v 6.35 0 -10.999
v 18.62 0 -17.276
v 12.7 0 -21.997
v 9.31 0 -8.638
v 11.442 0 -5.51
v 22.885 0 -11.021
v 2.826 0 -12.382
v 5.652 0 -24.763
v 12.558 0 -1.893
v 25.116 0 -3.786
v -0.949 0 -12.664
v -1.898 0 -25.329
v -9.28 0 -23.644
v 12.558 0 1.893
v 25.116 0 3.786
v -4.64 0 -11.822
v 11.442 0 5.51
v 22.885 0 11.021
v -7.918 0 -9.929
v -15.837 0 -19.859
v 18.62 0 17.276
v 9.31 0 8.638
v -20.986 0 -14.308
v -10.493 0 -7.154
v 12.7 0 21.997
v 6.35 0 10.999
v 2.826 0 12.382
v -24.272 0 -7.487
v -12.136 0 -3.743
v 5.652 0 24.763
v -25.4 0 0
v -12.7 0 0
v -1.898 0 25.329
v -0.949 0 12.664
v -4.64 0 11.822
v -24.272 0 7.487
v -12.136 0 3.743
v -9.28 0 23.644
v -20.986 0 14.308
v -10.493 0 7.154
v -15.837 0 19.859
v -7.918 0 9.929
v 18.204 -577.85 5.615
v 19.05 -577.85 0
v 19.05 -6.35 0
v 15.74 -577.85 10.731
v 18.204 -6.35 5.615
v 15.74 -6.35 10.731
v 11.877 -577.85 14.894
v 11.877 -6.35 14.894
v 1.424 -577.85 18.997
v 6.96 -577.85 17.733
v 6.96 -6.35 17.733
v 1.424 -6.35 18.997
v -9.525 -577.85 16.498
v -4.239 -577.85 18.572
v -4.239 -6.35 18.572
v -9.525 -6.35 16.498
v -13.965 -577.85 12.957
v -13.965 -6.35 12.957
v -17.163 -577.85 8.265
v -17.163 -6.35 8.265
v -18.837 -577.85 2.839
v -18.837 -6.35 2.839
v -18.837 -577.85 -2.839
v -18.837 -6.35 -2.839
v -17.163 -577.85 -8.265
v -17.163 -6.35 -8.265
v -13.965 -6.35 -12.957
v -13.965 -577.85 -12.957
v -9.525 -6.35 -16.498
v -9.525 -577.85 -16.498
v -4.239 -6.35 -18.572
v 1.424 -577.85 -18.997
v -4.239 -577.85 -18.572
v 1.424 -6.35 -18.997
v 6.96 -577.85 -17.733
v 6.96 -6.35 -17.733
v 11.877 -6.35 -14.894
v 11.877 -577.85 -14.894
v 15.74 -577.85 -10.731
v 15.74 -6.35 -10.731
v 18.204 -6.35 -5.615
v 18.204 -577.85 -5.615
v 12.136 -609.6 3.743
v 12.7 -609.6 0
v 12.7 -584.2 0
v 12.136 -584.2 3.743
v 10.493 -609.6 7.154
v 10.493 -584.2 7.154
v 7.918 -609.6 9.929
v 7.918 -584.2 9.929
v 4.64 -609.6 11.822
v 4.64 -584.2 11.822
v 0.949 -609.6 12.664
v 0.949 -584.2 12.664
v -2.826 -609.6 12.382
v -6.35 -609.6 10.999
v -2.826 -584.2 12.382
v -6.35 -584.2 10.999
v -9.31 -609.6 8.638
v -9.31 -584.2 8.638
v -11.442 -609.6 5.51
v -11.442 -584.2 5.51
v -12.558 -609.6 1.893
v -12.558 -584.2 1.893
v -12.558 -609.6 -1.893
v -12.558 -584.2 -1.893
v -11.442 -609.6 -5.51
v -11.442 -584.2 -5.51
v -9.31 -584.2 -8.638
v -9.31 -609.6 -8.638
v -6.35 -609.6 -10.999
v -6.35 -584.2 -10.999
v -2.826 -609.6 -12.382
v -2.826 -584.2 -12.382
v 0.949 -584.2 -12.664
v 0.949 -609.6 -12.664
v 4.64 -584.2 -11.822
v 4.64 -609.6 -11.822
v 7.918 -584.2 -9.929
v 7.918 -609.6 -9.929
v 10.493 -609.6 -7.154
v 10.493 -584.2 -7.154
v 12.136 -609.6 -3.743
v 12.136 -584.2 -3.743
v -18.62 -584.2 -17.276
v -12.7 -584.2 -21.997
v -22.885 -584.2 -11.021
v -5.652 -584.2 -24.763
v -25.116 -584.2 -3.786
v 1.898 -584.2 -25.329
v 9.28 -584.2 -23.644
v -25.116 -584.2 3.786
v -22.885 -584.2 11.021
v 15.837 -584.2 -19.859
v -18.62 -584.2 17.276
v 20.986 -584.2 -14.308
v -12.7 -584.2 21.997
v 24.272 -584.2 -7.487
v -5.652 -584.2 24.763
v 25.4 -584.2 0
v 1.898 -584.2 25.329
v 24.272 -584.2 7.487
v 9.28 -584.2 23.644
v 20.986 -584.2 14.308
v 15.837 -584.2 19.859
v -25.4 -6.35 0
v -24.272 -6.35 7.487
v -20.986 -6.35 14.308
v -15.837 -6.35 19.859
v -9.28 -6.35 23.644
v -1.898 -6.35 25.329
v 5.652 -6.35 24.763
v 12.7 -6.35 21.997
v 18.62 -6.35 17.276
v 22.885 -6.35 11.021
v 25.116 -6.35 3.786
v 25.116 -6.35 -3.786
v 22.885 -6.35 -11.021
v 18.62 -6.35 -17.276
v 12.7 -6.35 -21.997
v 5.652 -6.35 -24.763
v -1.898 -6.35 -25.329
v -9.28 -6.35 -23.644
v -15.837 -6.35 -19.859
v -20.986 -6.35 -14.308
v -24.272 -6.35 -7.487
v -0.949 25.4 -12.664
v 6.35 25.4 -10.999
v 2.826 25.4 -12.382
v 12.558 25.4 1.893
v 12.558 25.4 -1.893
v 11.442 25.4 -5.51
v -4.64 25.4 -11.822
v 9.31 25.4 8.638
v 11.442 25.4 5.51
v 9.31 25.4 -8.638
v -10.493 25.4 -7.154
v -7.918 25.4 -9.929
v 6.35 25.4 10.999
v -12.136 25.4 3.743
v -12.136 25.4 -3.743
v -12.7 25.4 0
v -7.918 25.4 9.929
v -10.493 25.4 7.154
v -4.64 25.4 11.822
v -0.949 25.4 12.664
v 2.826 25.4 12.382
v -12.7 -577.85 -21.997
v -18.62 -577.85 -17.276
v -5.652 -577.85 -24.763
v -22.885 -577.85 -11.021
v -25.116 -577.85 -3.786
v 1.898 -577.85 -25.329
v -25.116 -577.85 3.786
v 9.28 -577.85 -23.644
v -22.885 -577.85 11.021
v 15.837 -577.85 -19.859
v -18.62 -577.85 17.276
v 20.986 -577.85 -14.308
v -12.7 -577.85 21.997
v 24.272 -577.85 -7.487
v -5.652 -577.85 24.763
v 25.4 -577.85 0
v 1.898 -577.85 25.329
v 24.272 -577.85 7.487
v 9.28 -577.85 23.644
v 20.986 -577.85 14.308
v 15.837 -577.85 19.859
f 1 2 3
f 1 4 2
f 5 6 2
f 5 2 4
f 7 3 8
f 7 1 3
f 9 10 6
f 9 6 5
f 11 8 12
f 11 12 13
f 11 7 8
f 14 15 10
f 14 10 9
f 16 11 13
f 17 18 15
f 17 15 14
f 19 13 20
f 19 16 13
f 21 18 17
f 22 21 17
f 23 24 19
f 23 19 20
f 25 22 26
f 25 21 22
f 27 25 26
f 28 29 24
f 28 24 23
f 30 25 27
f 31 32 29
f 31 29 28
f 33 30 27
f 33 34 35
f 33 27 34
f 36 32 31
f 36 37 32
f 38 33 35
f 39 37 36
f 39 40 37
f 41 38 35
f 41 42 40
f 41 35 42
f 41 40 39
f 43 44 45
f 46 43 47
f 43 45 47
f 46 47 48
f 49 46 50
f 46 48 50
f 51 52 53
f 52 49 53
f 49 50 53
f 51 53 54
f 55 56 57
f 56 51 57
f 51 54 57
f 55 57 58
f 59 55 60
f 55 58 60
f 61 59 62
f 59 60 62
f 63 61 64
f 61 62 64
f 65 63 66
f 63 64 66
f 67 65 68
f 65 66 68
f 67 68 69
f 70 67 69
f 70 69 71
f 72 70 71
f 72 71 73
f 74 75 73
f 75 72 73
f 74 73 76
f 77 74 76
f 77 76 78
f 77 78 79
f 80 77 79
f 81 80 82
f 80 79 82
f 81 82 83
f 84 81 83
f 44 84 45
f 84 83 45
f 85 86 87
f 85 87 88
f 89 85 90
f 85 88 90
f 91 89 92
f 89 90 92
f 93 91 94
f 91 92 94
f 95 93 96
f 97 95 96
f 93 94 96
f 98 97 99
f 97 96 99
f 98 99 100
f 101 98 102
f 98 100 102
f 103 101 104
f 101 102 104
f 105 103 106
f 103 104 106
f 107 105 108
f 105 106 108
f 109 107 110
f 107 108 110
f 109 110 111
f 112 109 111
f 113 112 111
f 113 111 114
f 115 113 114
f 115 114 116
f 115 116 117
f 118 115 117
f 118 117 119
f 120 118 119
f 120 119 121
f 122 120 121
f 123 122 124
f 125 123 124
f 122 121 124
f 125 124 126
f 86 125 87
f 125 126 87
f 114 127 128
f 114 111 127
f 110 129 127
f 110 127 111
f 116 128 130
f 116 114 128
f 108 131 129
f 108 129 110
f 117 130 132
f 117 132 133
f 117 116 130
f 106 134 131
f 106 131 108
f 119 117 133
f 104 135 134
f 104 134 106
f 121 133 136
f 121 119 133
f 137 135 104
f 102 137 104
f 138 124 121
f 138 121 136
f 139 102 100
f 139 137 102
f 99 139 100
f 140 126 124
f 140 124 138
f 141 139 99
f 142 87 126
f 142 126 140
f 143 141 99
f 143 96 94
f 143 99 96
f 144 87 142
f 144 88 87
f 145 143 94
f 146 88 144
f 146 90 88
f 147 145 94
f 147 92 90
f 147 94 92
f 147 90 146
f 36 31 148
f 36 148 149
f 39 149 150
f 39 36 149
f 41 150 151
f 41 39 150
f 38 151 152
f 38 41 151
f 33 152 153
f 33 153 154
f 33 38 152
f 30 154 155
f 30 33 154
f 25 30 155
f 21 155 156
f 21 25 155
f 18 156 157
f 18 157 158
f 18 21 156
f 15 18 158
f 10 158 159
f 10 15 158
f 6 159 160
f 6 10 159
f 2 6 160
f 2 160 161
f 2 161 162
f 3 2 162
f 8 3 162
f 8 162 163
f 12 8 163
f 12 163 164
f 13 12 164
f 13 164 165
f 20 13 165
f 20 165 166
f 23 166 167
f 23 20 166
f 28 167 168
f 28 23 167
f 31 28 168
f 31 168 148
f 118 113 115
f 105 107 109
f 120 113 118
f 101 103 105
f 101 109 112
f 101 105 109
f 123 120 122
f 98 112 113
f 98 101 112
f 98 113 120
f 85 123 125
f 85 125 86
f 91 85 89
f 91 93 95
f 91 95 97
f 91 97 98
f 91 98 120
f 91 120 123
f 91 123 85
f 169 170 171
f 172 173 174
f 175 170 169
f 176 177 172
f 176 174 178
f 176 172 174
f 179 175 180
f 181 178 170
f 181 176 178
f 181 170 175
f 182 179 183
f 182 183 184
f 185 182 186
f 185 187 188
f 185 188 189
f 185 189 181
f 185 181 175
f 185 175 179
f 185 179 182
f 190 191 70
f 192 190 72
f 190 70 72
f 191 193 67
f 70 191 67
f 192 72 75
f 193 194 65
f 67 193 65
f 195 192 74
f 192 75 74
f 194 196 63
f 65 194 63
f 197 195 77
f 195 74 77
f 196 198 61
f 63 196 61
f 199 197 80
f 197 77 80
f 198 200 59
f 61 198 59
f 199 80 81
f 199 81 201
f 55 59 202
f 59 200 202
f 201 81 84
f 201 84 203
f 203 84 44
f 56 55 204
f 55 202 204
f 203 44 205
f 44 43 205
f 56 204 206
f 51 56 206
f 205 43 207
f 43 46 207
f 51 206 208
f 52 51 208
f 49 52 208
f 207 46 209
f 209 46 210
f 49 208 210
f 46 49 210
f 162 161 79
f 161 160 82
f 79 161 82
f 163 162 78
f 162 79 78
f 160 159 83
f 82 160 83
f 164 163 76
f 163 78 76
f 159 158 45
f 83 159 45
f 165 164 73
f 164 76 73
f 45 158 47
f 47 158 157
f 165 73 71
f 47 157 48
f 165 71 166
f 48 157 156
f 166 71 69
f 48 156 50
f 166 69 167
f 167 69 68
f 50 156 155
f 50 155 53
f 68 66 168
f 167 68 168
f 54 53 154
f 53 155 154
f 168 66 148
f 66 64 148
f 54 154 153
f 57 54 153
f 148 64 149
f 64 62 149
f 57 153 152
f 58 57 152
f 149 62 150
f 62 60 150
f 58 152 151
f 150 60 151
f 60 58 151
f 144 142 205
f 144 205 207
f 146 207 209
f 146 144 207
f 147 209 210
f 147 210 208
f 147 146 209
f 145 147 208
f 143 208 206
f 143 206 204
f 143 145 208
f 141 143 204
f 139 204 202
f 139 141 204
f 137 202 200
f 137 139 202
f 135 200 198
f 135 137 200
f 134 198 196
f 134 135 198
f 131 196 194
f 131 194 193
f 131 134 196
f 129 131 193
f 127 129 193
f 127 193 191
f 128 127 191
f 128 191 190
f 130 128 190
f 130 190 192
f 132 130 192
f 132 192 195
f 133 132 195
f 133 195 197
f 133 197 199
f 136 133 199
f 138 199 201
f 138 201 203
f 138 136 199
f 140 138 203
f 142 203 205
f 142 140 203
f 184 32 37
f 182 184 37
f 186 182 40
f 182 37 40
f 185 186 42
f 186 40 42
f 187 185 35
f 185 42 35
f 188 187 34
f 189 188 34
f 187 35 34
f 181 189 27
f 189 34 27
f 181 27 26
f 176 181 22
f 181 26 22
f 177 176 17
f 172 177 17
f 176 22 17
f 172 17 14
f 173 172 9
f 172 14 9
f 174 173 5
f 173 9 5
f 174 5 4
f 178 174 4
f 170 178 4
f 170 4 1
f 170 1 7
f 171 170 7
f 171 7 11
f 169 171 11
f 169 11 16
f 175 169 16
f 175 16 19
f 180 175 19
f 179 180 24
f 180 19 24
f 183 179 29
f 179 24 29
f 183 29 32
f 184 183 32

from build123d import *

# Parameters (mm, degrees)
F0_R     = 19.05
F1_DEPTH = 584.2
F3_R     = 25.4
F4_DEPTH = 6.35
F2_R     = 25.4
F2_R_2   = 19.05
F5_DEPTH = 6.35
F6_R     = 12.7
F7_DEPTH = 25.4
F8_R     = 12.7
F9_DEPTH = 25.4


with BuildPart() as f1:
    # F0 (on Front) → F1 (new body)
    with BuildSketch(Plane.XZ):
        Circle(F0_R)
    extrude(amount=F1_DEPTH)

    # F3 (on face) → F4 (join)
    with BuildSketch(Plane.XZ.offset(584.2)):
        Circle(F3_R)
    extrude(amount=-F4_DEPTH)

    # F2 (on face) → F5 (join)
    with BuildSketch(Plane(origin=(0, 0, 0), x_dir=(-1, 0, 0), z_dir=(0, 1, 0))):
        Circle(F2_R)
        Circle(F2_R_2, mode=Mode.SUBTRACT)
    extrude(amount=-F5_DEPTH)

    # F6 (on face) → F7 (join)
    with BuildSketch(Plane.XZ.offset(584.2)):
        Circle(F6_R)
    extrude(amount=F7_DEPTH)

    # F8 (on face) → F9 (join)
    with BuildSketch(Plane(origin=(0, 0, 0), x_dir=(-1, 0, 0), z_dir=(0, 1, 0))):
        Circle(F8_R)
    extrude(amount=F9_DEPTH)


solid = f1.part
